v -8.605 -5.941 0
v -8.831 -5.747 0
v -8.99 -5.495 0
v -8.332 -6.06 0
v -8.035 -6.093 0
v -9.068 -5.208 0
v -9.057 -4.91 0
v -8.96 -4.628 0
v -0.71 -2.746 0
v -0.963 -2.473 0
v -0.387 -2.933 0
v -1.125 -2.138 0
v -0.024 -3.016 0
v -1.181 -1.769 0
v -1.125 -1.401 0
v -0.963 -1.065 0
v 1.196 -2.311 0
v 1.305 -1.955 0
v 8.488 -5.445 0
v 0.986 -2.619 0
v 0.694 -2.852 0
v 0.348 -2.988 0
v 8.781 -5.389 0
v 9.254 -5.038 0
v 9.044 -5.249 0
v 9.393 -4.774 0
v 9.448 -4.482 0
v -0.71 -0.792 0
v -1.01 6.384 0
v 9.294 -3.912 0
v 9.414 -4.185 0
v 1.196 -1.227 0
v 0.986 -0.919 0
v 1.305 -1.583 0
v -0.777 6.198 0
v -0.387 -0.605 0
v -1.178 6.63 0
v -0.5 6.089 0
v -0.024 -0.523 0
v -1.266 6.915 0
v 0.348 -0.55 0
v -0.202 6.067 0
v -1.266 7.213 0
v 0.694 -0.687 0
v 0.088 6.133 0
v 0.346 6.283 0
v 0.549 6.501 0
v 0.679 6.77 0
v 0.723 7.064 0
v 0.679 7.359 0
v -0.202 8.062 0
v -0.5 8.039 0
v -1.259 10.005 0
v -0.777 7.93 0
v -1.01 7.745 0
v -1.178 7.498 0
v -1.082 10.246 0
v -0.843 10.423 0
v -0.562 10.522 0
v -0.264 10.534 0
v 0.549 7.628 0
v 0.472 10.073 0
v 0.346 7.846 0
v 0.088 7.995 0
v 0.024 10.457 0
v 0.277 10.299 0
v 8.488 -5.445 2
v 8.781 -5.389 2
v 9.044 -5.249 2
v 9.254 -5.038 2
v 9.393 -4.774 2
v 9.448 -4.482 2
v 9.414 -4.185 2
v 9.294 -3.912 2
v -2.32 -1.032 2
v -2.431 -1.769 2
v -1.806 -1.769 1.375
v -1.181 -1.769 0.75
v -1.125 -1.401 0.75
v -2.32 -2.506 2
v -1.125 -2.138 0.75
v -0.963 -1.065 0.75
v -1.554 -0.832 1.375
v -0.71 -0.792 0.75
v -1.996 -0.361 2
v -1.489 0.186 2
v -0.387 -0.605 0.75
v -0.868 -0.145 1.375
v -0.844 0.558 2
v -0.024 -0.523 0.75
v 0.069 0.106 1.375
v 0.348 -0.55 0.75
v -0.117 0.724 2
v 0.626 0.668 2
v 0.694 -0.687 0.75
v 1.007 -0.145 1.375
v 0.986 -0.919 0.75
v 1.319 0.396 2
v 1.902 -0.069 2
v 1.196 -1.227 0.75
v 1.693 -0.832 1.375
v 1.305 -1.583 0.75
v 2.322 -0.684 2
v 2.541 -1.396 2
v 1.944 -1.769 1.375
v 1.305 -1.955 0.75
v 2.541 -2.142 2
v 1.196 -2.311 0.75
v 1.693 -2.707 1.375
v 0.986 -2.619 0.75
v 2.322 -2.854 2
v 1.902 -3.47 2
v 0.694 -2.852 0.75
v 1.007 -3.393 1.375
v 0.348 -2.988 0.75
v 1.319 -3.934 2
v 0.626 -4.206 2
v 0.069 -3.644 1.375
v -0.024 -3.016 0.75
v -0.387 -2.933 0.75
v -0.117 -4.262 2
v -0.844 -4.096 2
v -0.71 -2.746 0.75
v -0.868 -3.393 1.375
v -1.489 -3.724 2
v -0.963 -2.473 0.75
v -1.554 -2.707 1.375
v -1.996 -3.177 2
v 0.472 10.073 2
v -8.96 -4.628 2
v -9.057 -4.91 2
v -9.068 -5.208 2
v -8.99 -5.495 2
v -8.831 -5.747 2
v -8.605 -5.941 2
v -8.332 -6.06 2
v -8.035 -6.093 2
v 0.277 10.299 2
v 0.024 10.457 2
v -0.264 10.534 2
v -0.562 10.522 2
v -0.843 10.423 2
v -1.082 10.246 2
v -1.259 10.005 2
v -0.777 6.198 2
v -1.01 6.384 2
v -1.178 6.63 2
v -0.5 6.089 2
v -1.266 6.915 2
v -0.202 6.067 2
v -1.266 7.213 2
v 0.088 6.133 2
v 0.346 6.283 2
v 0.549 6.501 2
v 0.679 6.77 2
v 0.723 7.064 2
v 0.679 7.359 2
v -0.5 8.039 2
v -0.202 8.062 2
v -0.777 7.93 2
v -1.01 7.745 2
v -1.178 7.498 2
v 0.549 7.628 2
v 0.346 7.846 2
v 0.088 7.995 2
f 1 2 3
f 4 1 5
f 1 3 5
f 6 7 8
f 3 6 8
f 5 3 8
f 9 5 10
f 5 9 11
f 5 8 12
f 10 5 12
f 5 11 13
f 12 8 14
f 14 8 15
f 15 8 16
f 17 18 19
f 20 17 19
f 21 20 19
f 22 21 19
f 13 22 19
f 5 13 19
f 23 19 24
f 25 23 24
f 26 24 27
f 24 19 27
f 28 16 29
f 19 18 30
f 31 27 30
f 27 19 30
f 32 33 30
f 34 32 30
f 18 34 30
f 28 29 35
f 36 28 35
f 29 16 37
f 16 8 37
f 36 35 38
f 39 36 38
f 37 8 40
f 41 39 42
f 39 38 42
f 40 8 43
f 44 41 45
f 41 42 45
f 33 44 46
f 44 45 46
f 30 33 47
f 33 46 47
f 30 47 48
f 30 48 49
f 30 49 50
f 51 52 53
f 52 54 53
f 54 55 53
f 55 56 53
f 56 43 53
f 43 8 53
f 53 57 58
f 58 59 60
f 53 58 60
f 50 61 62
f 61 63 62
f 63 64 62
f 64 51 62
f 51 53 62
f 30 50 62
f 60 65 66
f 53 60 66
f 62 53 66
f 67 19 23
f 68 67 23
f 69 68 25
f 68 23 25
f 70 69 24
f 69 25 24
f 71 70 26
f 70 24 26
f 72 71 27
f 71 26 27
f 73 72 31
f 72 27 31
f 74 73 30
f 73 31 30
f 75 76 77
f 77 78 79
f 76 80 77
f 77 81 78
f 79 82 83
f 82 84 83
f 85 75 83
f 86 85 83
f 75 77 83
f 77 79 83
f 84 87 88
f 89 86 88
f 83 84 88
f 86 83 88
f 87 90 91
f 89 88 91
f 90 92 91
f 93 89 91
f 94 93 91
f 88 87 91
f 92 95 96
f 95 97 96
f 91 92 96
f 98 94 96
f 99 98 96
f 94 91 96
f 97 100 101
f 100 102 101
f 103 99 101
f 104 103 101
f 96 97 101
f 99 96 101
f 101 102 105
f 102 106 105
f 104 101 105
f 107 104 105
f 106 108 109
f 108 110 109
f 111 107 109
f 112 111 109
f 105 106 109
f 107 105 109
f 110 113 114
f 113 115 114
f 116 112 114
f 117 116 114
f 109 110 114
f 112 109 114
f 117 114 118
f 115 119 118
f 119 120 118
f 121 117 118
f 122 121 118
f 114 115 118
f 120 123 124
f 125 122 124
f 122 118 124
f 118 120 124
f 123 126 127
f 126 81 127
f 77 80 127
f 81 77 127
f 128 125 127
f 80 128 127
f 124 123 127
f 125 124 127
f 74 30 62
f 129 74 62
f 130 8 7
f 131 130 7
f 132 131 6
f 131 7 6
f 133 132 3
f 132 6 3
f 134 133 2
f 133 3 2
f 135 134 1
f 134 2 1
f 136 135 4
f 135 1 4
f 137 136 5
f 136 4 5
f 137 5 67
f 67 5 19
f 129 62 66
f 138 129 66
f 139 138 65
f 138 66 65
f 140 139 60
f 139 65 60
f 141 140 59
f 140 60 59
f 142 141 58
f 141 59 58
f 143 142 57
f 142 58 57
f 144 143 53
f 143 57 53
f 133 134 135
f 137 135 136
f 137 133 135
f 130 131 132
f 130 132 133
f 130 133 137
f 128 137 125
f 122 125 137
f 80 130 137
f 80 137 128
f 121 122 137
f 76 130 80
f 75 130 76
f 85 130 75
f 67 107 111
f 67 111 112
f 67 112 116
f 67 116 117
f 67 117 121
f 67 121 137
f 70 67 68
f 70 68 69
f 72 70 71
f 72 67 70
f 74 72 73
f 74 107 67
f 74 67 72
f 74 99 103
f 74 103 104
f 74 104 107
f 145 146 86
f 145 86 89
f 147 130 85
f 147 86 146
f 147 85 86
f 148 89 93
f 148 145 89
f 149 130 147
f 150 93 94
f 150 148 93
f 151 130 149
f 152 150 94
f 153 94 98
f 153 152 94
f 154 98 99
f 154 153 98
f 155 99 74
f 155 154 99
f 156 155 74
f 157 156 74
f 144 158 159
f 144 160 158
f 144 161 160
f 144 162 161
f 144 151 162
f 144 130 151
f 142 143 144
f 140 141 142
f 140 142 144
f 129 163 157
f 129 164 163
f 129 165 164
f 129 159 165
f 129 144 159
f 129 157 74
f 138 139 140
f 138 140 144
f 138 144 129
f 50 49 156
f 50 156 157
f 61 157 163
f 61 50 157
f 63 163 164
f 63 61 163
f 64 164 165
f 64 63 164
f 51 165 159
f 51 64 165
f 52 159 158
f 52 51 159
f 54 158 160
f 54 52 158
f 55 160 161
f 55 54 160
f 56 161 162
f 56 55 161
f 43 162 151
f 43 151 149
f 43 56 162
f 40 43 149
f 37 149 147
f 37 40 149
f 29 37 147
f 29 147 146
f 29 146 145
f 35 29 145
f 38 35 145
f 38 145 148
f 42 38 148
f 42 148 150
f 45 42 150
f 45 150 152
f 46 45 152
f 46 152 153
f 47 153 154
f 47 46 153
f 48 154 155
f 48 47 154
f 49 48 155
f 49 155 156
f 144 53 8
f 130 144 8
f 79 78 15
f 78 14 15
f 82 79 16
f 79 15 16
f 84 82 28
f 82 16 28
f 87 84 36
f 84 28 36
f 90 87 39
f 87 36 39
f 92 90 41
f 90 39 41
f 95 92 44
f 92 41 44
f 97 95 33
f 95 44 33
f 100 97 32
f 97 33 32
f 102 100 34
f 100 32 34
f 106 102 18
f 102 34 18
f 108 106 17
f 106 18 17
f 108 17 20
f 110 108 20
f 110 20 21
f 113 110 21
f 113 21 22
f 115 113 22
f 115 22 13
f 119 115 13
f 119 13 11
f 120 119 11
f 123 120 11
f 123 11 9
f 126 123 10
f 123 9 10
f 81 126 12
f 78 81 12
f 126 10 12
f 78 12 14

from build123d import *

# Parameters (mm, degrees)
F0_R           = 1
F1_DEPTH       = 2
F3_D           = 2.5
F3_DEPTH       = 15.81
F3_CSINK_D     = 5
F3_CSINK_ANGLE = 90
F3_TIP         = 0.7510757738


# Not quite as in the source:
# - a feature names something its author has since deleted; it is built from what else it names


with BuildPart() as f1:
    # F0 (on Top) → F1 (new body)
    with BuildSketch(Plane.XY):
        with BuildLine():
            Line((-8.0353952667, -6.0930074749), (8.4878063746, -5.4451317825))
            ThreePointArc((8.4878063746, -5.4451317825), (9.3335768433, -4.9115848639), (9.2943968921, -3.912352693))
            Line((9.2943968921, -3.912352693), (0.4717192633, 10.0732218341))
            ThreePointArc((0.4717192633, 10.0732218341), (-0.4132311567, 10.5389070865), (-1.2590016254, 10.0053601679))
            Line((-1.2590016254, 10.0053601679), (-8.9595256379, -4.6280900516))
            ThreePointArc((-8.9595256379, -4.6280900516), (-8.9203456867, -5.6273222225), (-8.0353952667, -6.0930074749))
        make_face()
        with Locations((-0.2769940404, 7.0643619393)):
            Circle(F0_R, mode=Mode.SUBTRACT)
    extrude(amount=F1_DEPTH)

    # F3
    with Locations(Plane.XY.offset(2)):
        with Locations((0.0693653225, -1.7690696287)):
            CounterSinkHole(F3_D / 2, F3_CSINK_D / 2, depth=F3_DEPTH, counter_sink_angle=F3_CSINK_ANGLE)
            with Locations((0, 0, -(F3_DEPTH + F3_TIP / 2))):  # 118° drill point
                Cone(0, F3_D / 2, F3_TIP, mode=Mode.SUBTRACT)


solid = f1.part
